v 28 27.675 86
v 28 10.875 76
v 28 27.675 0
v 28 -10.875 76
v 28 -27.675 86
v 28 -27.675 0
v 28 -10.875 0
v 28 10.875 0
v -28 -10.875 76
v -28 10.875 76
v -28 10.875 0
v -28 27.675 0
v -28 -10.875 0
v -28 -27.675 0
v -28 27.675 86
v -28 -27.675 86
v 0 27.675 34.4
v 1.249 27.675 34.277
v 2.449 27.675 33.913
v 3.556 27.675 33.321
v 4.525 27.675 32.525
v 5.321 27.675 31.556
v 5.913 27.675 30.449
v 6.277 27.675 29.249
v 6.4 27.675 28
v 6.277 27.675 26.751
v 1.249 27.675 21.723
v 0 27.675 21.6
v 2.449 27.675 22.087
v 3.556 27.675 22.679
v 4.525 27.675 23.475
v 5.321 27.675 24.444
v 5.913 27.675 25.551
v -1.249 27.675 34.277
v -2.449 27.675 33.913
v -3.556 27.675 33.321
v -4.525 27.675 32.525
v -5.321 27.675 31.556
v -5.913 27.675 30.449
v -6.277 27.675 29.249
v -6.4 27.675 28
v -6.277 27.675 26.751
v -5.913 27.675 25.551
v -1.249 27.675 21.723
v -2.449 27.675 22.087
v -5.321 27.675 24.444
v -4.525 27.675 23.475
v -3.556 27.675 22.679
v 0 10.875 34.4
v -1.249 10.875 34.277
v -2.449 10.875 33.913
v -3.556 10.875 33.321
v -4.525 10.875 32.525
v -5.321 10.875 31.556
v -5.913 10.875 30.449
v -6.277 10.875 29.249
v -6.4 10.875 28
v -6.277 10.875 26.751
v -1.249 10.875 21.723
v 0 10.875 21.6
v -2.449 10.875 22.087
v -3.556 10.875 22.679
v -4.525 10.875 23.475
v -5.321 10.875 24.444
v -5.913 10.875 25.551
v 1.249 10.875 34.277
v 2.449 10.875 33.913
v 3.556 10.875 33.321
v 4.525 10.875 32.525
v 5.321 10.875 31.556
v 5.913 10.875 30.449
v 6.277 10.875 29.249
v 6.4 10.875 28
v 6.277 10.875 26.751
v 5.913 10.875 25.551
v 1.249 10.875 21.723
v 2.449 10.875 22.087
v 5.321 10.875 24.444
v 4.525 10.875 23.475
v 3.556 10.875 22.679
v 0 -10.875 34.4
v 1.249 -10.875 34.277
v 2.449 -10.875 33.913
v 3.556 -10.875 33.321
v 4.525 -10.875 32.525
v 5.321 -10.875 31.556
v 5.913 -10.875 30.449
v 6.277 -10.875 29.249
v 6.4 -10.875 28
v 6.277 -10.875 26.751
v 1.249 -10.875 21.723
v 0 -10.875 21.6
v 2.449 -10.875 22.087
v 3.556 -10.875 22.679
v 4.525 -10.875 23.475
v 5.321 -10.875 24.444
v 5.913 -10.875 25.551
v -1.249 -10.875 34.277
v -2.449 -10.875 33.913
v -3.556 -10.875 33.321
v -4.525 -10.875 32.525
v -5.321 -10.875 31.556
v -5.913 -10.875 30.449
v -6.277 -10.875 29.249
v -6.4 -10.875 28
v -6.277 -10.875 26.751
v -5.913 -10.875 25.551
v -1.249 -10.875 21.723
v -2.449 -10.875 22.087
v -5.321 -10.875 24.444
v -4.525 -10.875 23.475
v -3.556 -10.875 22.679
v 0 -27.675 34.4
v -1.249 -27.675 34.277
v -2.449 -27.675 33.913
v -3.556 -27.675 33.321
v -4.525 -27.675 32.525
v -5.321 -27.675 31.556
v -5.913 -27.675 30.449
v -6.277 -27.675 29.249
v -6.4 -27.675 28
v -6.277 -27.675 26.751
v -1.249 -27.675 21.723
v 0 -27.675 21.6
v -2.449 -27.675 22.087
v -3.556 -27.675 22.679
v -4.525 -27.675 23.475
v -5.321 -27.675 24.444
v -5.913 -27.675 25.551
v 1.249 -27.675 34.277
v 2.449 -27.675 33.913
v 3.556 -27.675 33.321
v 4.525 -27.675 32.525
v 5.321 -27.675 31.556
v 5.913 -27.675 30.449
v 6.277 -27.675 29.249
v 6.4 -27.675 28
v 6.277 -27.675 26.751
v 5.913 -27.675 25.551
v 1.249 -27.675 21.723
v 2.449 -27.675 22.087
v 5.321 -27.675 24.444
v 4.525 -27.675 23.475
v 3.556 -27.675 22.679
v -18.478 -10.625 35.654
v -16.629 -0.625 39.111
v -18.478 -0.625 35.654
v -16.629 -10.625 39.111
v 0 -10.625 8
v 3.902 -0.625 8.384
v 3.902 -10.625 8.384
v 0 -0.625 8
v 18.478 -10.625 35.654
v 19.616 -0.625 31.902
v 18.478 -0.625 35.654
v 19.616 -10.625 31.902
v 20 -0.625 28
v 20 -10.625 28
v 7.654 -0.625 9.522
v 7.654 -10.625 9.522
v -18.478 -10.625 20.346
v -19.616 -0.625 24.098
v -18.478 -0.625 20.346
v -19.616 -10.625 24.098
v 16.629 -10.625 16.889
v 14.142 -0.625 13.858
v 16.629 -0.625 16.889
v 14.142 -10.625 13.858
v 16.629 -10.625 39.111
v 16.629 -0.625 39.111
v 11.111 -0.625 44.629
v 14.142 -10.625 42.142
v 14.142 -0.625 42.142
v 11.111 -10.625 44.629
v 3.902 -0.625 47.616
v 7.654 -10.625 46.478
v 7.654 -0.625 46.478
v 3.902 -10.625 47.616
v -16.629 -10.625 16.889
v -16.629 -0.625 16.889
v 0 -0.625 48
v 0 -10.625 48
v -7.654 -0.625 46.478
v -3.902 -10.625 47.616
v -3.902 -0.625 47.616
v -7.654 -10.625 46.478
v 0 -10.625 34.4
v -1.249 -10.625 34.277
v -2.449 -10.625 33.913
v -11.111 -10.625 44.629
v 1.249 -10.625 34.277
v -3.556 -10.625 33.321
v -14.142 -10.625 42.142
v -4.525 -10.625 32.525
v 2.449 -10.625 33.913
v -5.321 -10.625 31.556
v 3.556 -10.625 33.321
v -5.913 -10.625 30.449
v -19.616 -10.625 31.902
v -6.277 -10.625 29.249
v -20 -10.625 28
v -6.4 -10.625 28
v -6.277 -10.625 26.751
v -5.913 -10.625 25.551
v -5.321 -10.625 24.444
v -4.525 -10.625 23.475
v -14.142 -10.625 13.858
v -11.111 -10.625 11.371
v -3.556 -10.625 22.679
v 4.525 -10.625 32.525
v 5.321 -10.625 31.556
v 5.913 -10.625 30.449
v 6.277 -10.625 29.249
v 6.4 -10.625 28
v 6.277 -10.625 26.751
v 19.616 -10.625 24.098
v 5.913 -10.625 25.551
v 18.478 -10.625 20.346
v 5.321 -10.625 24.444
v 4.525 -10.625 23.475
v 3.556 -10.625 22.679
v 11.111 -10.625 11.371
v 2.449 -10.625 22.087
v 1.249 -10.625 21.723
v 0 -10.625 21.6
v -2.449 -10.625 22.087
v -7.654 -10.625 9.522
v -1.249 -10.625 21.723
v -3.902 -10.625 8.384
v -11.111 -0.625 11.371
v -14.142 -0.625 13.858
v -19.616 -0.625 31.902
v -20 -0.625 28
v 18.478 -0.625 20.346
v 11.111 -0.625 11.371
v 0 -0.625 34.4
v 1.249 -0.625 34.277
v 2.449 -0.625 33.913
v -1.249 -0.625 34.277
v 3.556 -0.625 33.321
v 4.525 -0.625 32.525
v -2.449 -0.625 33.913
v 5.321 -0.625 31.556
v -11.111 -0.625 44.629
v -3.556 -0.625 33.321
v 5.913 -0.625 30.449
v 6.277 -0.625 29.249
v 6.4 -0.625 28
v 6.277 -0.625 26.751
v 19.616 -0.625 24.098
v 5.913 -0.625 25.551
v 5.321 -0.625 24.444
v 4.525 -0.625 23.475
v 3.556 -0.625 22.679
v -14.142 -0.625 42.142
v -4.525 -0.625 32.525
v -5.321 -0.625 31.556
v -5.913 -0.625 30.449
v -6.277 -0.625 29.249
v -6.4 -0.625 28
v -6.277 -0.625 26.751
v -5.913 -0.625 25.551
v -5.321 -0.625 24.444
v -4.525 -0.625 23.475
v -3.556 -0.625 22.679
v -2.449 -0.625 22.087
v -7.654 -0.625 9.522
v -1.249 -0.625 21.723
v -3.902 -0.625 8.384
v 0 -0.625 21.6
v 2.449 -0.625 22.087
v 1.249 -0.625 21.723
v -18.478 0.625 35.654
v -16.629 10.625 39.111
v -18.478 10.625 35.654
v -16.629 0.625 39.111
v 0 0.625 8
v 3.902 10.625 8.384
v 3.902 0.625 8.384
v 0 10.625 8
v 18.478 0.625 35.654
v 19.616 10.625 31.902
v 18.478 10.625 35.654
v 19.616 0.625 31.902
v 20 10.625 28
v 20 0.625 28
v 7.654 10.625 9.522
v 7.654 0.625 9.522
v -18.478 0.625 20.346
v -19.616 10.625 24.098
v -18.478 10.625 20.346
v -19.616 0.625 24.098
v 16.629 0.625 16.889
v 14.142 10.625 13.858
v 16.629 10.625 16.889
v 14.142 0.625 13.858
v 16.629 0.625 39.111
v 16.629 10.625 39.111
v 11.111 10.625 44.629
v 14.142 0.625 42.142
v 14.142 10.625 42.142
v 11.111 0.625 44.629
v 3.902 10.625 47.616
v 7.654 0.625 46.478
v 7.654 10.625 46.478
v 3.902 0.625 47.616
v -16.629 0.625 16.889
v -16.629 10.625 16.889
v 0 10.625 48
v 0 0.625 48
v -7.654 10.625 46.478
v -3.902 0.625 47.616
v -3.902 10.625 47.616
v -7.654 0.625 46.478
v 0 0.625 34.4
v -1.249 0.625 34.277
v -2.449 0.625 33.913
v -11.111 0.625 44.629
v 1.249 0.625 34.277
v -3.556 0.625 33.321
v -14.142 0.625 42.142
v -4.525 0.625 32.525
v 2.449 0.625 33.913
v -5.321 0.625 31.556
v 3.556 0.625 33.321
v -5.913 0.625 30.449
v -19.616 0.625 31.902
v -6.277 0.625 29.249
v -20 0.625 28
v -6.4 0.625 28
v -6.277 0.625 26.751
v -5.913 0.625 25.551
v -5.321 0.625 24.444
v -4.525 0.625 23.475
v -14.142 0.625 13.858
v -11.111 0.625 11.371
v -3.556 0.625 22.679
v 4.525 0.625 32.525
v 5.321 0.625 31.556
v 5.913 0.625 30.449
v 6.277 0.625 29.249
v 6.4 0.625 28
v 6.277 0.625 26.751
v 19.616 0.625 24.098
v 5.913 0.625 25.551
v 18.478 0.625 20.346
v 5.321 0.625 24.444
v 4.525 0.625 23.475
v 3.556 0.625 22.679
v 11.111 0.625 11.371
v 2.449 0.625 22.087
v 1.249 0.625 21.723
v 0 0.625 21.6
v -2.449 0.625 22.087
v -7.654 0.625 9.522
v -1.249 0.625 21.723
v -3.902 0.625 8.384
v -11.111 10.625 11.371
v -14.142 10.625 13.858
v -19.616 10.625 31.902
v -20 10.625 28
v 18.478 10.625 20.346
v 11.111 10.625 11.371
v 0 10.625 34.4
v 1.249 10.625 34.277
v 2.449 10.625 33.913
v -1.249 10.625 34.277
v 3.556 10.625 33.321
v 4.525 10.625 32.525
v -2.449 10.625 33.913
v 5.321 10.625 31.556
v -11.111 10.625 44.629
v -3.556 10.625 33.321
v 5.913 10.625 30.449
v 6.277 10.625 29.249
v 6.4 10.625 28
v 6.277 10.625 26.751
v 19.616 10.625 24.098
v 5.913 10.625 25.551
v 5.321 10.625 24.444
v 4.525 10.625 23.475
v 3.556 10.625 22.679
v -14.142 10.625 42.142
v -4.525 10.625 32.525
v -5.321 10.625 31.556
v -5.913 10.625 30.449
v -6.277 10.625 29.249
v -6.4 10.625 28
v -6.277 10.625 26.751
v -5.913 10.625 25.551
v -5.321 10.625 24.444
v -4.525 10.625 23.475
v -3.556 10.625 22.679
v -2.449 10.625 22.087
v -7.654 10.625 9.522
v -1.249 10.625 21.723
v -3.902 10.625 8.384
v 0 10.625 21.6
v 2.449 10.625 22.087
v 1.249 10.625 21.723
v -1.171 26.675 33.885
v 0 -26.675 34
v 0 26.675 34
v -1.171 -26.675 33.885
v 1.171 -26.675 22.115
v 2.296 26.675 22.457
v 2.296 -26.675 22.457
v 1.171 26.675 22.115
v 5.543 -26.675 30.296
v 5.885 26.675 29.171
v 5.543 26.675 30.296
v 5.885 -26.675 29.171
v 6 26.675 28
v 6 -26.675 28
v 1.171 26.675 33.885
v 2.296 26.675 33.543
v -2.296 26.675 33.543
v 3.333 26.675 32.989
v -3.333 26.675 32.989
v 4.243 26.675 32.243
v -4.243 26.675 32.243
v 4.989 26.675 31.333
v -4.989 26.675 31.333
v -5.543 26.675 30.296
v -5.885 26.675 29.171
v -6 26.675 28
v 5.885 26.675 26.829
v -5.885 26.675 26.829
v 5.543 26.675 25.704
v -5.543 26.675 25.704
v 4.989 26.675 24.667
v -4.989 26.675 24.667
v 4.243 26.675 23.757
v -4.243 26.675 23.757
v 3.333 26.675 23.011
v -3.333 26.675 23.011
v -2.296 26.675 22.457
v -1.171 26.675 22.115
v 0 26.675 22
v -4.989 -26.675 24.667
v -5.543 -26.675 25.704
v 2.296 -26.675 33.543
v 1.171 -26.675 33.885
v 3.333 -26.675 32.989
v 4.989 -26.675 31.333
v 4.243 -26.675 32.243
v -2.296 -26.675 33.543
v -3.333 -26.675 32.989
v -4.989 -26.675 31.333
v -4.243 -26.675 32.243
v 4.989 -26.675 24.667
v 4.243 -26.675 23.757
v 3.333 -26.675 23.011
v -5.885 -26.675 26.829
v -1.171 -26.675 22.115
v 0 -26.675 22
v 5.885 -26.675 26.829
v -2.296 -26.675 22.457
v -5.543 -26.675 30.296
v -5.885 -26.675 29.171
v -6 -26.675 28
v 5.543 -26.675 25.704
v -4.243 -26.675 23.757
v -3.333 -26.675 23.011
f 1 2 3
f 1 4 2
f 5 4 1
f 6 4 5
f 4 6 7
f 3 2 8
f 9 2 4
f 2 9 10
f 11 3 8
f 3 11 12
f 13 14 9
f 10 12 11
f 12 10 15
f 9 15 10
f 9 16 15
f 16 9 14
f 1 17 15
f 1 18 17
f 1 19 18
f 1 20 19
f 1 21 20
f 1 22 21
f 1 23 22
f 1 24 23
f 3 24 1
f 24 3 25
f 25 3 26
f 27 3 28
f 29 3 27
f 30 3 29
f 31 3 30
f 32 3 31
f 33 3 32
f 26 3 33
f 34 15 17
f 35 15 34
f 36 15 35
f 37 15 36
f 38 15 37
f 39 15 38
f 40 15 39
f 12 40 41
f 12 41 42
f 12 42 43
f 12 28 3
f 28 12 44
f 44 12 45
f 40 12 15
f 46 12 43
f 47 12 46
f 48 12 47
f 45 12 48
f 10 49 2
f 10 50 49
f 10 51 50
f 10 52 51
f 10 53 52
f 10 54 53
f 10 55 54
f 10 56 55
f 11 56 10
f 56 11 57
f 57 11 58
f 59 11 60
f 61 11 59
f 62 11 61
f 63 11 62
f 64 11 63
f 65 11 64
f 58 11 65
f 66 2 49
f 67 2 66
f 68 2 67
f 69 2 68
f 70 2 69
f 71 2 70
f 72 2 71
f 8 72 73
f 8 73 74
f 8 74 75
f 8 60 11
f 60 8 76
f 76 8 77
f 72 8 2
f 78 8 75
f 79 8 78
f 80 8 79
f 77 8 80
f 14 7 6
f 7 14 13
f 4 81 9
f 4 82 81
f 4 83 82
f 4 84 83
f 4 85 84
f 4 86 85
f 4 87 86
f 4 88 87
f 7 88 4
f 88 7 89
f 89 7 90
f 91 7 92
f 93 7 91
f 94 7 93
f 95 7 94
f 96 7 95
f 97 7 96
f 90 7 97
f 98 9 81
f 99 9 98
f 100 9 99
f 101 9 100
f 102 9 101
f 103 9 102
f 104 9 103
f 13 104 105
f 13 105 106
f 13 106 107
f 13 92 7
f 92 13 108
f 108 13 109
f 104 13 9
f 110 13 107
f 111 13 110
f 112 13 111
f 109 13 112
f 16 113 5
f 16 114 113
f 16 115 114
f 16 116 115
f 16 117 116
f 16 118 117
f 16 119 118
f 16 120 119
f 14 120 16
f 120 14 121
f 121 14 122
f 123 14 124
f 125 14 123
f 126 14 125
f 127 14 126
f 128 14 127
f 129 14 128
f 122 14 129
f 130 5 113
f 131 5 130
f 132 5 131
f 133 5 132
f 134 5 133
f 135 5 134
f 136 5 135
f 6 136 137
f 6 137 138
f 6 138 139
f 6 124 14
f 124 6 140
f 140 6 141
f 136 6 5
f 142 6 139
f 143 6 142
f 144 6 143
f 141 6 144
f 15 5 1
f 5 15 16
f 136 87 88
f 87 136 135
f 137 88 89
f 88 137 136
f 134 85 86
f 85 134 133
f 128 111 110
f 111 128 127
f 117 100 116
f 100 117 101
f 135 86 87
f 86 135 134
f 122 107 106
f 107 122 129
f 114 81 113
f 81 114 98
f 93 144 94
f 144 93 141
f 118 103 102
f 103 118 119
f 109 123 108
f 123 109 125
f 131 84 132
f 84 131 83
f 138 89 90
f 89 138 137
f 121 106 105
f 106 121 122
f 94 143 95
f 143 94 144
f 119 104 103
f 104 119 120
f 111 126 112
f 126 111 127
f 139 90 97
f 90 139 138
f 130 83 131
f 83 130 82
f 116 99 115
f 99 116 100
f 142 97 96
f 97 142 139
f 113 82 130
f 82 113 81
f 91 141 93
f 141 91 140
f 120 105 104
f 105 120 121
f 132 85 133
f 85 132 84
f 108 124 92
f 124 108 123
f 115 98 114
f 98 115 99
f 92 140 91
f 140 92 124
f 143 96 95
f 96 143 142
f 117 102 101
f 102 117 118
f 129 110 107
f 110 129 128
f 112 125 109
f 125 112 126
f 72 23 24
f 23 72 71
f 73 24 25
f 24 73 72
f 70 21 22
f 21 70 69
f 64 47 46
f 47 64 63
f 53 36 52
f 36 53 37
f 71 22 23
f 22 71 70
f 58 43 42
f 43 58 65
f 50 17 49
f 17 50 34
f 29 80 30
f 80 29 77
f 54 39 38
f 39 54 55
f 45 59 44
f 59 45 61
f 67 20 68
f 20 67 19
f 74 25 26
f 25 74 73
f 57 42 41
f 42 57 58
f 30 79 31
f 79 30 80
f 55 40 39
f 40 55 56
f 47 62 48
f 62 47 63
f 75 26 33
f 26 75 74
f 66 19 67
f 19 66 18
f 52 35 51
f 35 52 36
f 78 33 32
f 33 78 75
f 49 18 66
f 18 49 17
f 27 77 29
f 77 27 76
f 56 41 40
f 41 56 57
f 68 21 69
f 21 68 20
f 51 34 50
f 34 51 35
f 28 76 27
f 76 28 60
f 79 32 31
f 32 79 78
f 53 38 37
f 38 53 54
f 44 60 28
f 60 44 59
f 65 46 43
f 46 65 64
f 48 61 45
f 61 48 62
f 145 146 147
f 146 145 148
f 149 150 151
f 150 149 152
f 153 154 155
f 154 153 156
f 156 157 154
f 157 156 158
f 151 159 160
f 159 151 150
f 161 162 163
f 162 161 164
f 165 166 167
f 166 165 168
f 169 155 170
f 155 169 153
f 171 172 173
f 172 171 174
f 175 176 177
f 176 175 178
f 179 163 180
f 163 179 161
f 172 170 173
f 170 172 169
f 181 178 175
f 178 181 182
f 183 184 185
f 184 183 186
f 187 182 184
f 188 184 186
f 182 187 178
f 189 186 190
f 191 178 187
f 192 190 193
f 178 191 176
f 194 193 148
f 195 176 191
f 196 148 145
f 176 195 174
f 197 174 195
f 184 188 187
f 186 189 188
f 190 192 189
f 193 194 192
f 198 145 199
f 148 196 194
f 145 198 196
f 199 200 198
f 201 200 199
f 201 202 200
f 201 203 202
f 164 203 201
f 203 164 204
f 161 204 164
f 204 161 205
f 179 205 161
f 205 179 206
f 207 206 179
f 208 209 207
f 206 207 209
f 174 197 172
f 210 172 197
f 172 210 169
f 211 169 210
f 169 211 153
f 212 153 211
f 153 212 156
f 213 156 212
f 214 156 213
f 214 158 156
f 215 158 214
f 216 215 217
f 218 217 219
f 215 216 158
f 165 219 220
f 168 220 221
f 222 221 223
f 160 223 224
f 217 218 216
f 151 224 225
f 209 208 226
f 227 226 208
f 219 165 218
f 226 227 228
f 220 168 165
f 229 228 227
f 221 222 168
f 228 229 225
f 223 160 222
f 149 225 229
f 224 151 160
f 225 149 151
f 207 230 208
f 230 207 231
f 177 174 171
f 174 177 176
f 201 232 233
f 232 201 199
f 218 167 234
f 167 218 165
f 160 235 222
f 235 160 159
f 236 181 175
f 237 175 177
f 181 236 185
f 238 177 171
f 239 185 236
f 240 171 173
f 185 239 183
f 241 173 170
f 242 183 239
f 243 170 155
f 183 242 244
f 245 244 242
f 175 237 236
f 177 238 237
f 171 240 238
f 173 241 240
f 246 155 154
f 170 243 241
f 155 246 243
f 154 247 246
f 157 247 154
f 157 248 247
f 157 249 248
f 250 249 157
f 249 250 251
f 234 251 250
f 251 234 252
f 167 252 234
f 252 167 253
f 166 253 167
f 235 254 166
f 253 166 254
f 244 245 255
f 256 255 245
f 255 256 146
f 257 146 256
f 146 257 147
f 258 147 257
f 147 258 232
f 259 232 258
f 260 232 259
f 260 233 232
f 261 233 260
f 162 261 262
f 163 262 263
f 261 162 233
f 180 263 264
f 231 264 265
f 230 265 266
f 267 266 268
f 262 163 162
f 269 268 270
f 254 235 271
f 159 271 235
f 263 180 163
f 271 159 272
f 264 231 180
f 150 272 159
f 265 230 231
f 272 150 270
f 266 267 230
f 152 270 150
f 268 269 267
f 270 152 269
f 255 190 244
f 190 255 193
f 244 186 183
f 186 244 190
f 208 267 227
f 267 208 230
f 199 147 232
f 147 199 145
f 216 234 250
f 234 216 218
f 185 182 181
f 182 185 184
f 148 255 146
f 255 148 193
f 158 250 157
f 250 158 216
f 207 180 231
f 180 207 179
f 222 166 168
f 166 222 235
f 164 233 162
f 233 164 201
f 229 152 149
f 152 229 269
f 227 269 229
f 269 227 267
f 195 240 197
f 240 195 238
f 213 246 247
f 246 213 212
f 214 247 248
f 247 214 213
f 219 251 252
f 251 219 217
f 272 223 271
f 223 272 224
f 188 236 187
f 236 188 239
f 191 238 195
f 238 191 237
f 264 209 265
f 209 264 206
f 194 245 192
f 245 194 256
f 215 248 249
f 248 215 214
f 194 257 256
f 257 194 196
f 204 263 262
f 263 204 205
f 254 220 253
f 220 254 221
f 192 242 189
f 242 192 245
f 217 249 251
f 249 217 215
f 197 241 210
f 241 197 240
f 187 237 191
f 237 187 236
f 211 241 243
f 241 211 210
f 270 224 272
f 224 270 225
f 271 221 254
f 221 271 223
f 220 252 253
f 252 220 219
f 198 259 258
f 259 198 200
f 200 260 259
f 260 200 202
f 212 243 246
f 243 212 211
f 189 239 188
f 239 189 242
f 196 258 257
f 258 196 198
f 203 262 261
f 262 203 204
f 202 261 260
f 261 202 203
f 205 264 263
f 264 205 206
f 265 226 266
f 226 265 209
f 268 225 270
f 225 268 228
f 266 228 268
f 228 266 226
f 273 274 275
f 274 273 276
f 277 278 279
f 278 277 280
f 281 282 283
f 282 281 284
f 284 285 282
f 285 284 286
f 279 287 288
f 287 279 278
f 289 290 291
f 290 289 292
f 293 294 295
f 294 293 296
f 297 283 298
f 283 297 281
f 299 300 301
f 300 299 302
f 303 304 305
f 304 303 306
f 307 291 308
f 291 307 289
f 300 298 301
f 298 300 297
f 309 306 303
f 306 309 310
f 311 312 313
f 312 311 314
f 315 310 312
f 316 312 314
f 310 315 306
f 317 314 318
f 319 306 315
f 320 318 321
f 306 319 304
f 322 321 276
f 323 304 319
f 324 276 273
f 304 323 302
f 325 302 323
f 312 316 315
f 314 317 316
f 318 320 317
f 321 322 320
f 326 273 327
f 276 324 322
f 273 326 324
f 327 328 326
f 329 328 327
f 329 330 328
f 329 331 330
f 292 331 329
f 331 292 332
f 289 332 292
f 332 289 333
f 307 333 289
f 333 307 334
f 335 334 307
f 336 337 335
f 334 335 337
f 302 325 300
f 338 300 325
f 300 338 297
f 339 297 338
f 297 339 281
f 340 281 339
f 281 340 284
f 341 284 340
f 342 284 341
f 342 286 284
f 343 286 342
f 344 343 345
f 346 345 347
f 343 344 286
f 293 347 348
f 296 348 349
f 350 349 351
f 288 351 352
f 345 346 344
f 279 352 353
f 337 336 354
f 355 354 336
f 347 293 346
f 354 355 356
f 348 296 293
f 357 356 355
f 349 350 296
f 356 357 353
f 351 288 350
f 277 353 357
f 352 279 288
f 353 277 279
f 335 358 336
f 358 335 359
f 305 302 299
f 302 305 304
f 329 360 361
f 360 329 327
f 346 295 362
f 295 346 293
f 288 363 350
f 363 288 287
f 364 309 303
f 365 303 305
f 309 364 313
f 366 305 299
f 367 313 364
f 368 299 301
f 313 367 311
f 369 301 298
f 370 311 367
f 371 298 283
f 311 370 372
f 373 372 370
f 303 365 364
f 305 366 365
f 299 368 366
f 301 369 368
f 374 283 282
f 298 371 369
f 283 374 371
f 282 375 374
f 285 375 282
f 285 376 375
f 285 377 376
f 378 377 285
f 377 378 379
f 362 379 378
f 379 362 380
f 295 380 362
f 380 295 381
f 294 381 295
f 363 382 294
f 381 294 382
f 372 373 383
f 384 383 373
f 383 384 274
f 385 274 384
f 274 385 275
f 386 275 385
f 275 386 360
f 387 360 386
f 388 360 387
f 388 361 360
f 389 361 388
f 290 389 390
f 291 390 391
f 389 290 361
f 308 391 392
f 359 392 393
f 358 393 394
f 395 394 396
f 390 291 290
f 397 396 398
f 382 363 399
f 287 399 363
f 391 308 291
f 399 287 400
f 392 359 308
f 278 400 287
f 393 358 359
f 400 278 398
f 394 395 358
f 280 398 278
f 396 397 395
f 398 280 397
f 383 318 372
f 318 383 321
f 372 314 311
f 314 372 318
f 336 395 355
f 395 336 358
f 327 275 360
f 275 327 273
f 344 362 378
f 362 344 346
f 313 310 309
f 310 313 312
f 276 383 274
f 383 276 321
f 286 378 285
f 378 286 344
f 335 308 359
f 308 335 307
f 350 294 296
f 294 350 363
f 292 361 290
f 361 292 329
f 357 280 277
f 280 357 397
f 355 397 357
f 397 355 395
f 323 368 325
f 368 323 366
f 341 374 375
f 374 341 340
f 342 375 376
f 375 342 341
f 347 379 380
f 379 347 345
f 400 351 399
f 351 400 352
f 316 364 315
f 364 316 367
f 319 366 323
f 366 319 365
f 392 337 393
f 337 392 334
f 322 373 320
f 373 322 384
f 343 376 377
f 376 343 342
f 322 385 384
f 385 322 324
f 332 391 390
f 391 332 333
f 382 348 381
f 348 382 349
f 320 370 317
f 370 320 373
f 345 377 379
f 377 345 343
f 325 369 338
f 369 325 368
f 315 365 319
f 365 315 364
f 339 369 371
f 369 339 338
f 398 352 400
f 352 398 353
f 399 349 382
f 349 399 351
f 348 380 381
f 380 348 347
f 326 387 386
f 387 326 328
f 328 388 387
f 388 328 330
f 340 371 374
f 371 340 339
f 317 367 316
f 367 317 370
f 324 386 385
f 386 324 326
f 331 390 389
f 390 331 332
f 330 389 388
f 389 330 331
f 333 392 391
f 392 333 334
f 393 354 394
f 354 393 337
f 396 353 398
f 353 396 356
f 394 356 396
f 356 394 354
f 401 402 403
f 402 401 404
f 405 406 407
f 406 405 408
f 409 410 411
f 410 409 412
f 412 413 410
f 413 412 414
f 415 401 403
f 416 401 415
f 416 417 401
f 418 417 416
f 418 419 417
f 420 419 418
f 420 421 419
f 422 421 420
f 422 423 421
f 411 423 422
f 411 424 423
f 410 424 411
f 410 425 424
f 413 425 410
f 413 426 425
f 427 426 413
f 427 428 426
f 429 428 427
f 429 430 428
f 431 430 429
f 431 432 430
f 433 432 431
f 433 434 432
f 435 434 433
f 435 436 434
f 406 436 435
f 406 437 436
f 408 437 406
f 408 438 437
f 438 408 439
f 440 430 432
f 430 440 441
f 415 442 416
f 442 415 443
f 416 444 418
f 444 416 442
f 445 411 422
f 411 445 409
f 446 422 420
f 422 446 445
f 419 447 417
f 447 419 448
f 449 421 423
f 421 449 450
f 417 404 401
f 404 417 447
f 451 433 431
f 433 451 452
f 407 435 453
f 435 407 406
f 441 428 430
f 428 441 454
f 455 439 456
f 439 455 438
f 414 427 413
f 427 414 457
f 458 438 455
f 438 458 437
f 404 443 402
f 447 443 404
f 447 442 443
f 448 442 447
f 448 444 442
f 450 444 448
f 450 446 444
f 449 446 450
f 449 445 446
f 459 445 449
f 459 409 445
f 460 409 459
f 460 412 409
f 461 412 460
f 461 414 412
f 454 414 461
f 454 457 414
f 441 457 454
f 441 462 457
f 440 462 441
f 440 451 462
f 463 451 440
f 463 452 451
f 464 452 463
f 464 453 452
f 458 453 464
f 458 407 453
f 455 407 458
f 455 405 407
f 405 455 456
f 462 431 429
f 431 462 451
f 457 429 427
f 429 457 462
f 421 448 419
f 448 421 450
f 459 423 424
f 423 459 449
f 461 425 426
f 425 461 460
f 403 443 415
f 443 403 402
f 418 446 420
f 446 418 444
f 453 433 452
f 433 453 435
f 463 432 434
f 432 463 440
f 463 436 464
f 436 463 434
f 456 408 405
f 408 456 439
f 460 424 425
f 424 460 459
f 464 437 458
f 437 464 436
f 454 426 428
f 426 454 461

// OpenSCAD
$fn = 32;

// ------------------------------------------------------------------------
// Trolley wheel set: wheels d40, fork 76 mm tall
// Every part is its own module, assembly() places every instance.
// ------------------------------------------------------------------------

// --- part 1 ---
module trolley_fork() {
  difference() {
    union() {
      translate([-28, 10.875, 0]) cube([56, 16.8, 76]);
      translate([-28, -27.675, 0]) cube([56, 16.8, 76]);
      translate([-28, -27.675, 76]) cube([56, 55.35, 10]);
    }
    translate([0, -19.275, 28]) rotate([90, 0, 0]) cylinder(h = 18.8, d = 12.8, center = true);
    translate([0, 19.275, 28]) rotate([90, 0, 0]) cylinder(h = 18.8, d = 12.8, center = true);
  }
}

// --- part 2 ---
module trolley_wheel() {
  difference() {
      translate([0, 0, 0]) cylinder(h = 10, d = 40);
      translate([0, 0, -1]) cylinder(h = 12, d = 12.8);
    }
}

// --- part 3 ---
module trolley_axle() {
  translate([0, 0, -26.675]) cylinder(h = 53.35, d = 12);
}

// --- assembly ---
module assembly() {
  color([0.80, 0.24, 0.20]) translate([0, 0, 0]) rotate([0, 0, 0]) trolley_fork();
  color([0.20, 0.45, 0.75]) translate([0, -0.625, 28]) rotate([90, 0, 0]) trolley_wheel();
  color([0.25, 0.62, 0.32]) translate([0, 10.625, 28]) rotate([90, 0, 0]) trolley_wheel();
  color([0.92, 0.70, 0.18]) translate([0, 0, 28]) rotate([90, 0, 0]) trolley_axle();
}

assembly();
